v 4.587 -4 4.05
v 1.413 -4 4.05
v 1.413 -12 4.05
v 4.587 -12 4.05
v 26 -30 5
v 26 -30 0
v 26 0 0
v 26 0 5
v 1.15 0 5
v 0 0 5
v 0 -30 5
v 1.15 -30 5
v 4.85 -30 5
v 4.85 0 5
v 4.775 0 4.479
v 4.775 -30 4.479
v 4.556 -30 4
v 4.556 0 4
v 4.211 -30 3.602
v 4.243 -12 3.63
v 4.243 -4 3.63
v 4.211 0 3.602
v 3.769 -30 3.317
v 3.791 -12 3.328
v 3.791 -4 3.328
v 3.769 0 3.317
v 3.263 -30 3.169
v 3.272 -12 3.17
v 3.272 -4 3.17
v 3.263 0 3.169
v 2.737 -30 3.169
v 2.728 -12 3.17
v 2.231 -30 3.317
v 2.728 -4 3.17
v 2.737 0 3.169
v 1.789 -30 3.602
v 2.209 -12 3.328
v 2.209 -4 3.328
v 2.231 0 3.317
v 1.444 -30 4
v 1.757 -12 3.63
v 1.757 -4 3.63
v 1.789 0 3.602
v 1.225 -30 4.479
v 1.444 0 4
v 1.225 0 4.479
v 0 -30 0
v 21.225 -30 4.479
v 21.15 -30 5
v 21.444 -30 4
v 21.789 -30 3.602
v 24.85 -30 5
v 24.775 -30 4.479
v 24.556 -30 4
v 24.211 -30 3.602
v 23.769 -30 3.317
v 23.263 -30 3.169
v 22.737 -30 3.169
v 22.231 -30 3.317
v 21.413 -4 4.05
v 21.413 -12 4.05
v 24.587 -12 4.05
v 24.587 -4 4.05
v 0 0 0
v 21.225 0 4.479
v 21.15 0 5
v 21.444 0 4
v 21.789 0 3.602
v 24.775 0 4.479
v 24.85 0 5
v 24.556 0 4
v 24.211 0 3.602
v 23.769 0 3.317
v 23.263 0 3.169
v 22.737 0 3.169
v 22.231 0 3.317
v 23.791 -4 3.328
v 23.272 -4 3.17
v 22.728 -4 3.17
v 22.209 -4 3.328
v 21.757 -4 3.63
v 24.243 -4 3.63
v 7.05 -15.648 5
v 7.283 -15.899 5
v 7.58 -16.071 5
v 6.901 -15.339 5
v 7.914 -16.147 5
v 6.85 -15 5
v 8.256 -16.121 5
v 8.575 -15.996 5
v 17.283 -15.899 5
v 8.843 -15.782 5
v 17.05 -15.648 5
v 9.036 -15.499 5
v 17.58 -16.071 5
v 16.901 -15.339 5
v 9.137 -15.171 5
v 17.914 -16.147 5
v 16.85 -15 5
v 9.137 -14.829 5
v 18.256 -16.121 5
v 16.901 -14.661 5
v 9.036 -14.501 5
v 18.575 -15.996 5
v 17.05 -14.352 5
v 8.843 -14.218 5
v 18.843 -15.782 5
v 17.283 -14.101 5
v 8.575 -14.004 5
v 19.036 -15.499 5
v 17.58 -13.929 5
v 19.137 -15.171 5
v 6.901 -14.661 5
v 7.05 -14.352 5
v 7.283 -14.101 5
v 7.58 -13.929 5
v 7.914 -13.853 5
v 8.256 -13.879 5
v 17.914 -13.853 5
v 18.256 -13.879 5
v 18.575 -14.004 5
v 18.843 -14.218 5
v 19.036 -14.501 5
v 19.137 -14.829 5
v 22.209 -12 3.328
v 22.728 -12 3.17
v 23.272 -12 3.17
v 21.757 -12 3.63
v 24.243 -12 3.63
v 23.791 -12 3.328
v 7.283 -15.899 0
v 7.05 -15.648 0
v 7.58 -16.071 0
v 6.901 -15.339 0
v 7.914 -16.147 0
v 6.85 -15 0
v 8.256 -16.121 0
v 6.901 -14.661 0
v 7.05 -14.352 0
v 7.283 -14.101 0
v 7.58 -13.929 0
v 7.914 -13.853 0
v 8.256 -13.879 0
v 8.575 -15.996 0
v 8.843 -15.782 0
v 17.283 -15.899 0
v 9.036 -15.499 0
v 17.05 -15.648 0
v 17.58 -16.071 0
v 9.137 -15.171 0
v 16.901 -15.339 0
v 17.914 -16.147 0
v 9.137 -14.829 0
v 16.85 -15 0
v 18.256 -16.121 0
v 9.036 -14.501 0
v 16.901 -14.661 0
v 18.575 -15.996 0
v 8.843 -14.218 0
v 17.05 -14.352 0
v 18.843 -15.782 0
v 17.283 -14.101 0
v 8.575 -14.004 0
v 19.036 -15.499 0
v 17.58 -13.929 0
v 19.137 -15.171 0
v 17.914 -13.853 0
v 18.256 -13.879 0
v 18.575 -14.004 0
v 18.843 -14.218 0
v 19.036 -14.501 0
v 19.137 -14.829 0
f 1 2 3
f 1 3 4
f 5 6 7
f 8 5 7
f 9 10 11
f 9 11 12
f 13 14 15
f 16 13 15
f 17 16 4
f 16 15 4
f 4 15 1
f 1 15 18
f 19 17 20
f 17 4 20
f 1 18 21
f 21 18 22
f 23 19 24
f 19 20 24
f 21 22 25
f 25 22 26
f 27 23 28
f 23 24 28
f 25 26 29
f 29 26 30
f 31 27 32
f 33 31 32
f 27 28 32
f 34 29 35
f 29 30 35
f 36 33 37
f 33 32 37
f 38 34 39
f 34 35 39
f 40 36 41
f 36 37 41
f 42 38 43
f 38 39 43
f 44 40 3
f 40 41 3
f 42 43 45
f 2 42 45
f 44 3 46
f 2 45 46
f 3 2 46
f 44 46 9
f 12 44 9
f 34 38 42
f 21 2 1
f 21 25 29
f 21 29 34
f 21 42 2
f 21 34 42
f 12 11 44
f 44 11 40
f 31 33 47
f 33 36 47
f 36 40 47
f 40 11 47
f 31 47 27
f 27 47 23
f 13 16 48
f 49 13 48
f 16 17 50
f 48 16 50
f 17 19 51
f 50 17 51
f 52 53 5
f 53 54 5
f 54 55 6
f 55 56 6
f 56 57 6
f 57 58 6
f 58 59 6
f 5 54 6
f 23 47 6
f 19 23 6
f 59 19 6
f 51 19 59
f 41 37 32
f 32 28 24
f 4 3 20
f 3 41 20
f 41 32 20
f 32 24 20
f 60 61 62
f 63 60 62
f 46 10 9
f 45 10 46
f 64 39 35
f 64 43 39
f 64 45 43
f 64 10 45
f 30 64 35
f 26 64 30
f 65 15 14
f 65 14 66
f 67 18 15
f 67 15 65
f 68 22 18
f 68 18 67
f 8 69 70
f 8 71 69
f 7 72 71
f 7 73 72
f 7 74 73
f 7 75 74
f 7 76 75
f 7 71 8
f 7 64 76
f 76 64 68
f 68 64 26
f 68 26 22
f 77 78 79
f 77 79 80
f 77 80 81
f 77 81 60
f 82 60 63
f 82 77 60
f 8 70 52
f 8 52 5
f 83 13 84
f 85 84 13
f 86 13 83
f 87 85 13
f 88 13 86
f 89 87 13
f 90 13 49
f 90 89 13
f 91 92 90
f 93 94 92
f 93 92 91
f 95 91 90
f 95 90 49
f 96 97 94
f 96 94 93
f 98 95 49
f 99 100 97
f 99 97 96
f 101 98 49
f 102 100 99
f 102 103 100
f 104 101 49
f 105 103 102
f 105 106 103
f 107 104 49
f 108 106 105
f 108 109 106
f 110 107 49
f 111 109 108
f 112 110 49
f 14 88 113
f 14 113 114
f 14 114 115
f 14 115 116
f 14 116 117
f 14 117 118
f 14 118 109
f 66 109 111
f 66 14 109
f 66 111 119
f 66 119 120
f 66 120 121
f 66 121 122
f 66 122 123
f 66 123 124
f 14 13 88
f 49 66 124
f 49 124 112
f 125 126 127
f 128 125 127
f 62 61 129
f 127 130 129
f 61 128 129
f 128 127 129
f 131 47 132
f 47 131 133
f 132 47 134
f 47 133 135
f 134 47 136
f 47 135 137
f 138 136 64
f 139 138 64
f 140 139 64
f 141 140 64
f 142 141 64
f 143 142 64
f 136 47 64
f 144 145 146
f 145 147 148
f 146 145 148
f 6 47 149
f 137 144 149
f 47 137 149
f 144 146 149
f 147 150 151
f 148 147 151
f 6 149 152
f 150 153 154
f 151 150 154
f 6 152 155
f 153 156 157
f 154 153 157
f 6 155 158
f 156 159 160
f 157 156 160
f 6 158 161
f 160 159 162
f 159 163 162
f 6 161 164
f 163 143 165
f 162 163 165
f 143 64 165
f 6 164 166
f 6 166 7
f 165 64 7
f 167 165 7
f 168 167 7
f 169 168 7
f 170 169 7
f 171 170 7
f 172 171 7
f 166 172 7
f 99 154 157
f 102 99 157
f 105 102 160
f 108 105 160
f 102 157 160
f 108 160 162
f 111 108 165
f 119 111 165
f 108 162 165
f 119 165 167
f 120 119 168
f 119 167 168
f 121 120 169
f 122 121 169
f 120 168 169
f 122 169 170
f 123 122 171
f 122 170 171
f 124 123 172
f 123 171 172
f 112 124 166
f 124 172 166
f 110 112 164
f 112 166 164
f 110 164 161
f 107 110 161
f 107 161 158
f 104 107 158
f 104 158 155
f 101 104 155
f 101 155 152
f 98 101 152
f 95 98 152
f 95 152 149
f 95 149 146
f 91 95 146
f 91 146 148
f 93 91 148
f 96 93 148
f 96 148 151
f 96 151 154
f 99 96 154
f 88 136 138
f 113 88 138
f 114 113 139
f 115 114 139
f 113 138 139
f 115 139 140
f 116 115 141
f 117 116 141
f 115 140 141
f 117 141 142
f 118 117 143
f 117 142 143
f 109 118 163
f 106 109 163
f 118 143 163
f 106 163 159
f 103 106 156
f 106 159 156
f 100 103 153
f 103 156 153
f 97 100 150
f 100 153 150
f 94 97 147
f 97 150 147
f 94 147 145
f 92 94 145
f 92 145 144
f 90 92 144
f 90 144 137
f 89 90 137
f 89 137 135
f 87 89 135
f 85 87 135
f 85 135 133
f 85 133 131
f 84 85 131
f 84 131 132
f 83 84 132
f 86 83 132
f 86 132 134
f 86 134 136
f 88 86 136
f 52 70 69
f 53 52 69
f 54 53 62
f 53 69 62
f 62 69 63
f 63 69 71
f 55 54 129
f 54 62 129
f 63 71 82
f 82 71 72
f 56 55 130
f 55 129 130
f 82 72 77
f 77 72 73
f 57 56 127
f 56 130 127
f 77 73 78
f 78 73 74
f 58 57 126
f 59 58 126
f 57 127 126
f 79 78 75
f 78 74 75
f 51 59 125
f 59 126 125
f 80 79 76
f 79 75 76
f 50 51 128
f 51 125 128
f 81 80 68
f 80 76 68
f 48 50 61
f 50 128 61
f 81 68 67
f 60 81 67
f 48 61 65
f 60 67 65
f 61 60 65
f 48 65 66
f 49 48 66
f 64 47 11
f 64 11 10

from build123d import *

# Parameters (mm, degrees)
SKETCH_1_W          = 26
SKETCH_1_H          = 30
EXTRUDE_1_DEPTH     = 5
SKETCH_2_R          = 1.85
CUT_EXTRUDE_1_DEPTH = 12
EXTRUDE_START       = 8
EXTRUDE_2_DEPTH     = 8
SKETCH_5_R          = 1.85
CUT_EXTRUDE_2_DEPTH = 33.015621187
SKETCH_6_R          = 1.15
CUT_EXTRUDE_3_DEPTH = 8


with BuildPart() as part:
    # 草图1 → 凸台-拉伸1 (new body)
    with BuildSketch(Plane.XY):
        with Locations((13, -15)):
            Rectangle(SKETCH_1_W, SKETCH_1_H)
    extrude(amount=EXTRUDE_1_DEPTH)

    # 草图2 → 切除-拉伸1 (cut)
    with BuildSketch(Plane(origin=(0, 0, 0), x_dir=(1, 0, 0), z_dir=(0, 1, 0))):
        with Locations((3, -5)):
            Circle(SKETCH_2_R)
        with Locations((23, -5)):
            Circle(SKETCH_2_R)
    extrude(amount=-CUT_EXTRUDE_1_DEPTH, mode=Mode.SUBTRACT)

    # 草图4 → 凸台-拉伸2 (add)
    with BuildSketch(Plane(origin=(0, -12, 0), x_dir=(1, 0, 0), z_dir=(0, 1, 0)).offset(EXTRUDE_START)):
        with BuildLine():
            Line((1.412549213, -4.05), (4.587450787, -4.05))
            ThreePointArc((4.587450787, -4.05), (3, -3.15), (1.412549213, -4.05))
        make_face()
        with BuildLine():
            Line((21.412549213, -4.05), (24.587450787, -4.05))
            ThreePointArc((24.587450787, -4.05), (23, -3.15), (21.412549213, -4.05))
        make_face()
    extrude(amount=-EXTRUDE_2_DEPTH)

    # 草图5 → 切除-拉伸2 (cut, through all)
    with BuildSketch(Plane(origin=(0, -12, 0), x_dir=(1, 0, 0), z_dir=(0, 1, 0))):
        with Locations((3, -5)):
            Circle(SKETCH_5_R)
        with Locations((23, -5)):
            Circle(SKETCH_5_R)
    extrude(amount=-CUT_EXTRUDE_2_DEPTH, mode=Mode.SUBTRACT)

    # 草图6 → 切除-拉伸3 (cut)
    with BuildSketch(Plane(origin=(0, 0, 0), x_dir=(-1, 0, 0), z_dir=(0, 0, -1))):
        with Locations((-18, -15)):
            Circle(SKETCH_6_R)
        with Locations((-8, -15)):
            Circle(SKETCH_6_R)
    extrude(amount=-CUT_EXTRUDE_3_DEPTH, mode=Mode.SUBTRACT)


solid = part.part
